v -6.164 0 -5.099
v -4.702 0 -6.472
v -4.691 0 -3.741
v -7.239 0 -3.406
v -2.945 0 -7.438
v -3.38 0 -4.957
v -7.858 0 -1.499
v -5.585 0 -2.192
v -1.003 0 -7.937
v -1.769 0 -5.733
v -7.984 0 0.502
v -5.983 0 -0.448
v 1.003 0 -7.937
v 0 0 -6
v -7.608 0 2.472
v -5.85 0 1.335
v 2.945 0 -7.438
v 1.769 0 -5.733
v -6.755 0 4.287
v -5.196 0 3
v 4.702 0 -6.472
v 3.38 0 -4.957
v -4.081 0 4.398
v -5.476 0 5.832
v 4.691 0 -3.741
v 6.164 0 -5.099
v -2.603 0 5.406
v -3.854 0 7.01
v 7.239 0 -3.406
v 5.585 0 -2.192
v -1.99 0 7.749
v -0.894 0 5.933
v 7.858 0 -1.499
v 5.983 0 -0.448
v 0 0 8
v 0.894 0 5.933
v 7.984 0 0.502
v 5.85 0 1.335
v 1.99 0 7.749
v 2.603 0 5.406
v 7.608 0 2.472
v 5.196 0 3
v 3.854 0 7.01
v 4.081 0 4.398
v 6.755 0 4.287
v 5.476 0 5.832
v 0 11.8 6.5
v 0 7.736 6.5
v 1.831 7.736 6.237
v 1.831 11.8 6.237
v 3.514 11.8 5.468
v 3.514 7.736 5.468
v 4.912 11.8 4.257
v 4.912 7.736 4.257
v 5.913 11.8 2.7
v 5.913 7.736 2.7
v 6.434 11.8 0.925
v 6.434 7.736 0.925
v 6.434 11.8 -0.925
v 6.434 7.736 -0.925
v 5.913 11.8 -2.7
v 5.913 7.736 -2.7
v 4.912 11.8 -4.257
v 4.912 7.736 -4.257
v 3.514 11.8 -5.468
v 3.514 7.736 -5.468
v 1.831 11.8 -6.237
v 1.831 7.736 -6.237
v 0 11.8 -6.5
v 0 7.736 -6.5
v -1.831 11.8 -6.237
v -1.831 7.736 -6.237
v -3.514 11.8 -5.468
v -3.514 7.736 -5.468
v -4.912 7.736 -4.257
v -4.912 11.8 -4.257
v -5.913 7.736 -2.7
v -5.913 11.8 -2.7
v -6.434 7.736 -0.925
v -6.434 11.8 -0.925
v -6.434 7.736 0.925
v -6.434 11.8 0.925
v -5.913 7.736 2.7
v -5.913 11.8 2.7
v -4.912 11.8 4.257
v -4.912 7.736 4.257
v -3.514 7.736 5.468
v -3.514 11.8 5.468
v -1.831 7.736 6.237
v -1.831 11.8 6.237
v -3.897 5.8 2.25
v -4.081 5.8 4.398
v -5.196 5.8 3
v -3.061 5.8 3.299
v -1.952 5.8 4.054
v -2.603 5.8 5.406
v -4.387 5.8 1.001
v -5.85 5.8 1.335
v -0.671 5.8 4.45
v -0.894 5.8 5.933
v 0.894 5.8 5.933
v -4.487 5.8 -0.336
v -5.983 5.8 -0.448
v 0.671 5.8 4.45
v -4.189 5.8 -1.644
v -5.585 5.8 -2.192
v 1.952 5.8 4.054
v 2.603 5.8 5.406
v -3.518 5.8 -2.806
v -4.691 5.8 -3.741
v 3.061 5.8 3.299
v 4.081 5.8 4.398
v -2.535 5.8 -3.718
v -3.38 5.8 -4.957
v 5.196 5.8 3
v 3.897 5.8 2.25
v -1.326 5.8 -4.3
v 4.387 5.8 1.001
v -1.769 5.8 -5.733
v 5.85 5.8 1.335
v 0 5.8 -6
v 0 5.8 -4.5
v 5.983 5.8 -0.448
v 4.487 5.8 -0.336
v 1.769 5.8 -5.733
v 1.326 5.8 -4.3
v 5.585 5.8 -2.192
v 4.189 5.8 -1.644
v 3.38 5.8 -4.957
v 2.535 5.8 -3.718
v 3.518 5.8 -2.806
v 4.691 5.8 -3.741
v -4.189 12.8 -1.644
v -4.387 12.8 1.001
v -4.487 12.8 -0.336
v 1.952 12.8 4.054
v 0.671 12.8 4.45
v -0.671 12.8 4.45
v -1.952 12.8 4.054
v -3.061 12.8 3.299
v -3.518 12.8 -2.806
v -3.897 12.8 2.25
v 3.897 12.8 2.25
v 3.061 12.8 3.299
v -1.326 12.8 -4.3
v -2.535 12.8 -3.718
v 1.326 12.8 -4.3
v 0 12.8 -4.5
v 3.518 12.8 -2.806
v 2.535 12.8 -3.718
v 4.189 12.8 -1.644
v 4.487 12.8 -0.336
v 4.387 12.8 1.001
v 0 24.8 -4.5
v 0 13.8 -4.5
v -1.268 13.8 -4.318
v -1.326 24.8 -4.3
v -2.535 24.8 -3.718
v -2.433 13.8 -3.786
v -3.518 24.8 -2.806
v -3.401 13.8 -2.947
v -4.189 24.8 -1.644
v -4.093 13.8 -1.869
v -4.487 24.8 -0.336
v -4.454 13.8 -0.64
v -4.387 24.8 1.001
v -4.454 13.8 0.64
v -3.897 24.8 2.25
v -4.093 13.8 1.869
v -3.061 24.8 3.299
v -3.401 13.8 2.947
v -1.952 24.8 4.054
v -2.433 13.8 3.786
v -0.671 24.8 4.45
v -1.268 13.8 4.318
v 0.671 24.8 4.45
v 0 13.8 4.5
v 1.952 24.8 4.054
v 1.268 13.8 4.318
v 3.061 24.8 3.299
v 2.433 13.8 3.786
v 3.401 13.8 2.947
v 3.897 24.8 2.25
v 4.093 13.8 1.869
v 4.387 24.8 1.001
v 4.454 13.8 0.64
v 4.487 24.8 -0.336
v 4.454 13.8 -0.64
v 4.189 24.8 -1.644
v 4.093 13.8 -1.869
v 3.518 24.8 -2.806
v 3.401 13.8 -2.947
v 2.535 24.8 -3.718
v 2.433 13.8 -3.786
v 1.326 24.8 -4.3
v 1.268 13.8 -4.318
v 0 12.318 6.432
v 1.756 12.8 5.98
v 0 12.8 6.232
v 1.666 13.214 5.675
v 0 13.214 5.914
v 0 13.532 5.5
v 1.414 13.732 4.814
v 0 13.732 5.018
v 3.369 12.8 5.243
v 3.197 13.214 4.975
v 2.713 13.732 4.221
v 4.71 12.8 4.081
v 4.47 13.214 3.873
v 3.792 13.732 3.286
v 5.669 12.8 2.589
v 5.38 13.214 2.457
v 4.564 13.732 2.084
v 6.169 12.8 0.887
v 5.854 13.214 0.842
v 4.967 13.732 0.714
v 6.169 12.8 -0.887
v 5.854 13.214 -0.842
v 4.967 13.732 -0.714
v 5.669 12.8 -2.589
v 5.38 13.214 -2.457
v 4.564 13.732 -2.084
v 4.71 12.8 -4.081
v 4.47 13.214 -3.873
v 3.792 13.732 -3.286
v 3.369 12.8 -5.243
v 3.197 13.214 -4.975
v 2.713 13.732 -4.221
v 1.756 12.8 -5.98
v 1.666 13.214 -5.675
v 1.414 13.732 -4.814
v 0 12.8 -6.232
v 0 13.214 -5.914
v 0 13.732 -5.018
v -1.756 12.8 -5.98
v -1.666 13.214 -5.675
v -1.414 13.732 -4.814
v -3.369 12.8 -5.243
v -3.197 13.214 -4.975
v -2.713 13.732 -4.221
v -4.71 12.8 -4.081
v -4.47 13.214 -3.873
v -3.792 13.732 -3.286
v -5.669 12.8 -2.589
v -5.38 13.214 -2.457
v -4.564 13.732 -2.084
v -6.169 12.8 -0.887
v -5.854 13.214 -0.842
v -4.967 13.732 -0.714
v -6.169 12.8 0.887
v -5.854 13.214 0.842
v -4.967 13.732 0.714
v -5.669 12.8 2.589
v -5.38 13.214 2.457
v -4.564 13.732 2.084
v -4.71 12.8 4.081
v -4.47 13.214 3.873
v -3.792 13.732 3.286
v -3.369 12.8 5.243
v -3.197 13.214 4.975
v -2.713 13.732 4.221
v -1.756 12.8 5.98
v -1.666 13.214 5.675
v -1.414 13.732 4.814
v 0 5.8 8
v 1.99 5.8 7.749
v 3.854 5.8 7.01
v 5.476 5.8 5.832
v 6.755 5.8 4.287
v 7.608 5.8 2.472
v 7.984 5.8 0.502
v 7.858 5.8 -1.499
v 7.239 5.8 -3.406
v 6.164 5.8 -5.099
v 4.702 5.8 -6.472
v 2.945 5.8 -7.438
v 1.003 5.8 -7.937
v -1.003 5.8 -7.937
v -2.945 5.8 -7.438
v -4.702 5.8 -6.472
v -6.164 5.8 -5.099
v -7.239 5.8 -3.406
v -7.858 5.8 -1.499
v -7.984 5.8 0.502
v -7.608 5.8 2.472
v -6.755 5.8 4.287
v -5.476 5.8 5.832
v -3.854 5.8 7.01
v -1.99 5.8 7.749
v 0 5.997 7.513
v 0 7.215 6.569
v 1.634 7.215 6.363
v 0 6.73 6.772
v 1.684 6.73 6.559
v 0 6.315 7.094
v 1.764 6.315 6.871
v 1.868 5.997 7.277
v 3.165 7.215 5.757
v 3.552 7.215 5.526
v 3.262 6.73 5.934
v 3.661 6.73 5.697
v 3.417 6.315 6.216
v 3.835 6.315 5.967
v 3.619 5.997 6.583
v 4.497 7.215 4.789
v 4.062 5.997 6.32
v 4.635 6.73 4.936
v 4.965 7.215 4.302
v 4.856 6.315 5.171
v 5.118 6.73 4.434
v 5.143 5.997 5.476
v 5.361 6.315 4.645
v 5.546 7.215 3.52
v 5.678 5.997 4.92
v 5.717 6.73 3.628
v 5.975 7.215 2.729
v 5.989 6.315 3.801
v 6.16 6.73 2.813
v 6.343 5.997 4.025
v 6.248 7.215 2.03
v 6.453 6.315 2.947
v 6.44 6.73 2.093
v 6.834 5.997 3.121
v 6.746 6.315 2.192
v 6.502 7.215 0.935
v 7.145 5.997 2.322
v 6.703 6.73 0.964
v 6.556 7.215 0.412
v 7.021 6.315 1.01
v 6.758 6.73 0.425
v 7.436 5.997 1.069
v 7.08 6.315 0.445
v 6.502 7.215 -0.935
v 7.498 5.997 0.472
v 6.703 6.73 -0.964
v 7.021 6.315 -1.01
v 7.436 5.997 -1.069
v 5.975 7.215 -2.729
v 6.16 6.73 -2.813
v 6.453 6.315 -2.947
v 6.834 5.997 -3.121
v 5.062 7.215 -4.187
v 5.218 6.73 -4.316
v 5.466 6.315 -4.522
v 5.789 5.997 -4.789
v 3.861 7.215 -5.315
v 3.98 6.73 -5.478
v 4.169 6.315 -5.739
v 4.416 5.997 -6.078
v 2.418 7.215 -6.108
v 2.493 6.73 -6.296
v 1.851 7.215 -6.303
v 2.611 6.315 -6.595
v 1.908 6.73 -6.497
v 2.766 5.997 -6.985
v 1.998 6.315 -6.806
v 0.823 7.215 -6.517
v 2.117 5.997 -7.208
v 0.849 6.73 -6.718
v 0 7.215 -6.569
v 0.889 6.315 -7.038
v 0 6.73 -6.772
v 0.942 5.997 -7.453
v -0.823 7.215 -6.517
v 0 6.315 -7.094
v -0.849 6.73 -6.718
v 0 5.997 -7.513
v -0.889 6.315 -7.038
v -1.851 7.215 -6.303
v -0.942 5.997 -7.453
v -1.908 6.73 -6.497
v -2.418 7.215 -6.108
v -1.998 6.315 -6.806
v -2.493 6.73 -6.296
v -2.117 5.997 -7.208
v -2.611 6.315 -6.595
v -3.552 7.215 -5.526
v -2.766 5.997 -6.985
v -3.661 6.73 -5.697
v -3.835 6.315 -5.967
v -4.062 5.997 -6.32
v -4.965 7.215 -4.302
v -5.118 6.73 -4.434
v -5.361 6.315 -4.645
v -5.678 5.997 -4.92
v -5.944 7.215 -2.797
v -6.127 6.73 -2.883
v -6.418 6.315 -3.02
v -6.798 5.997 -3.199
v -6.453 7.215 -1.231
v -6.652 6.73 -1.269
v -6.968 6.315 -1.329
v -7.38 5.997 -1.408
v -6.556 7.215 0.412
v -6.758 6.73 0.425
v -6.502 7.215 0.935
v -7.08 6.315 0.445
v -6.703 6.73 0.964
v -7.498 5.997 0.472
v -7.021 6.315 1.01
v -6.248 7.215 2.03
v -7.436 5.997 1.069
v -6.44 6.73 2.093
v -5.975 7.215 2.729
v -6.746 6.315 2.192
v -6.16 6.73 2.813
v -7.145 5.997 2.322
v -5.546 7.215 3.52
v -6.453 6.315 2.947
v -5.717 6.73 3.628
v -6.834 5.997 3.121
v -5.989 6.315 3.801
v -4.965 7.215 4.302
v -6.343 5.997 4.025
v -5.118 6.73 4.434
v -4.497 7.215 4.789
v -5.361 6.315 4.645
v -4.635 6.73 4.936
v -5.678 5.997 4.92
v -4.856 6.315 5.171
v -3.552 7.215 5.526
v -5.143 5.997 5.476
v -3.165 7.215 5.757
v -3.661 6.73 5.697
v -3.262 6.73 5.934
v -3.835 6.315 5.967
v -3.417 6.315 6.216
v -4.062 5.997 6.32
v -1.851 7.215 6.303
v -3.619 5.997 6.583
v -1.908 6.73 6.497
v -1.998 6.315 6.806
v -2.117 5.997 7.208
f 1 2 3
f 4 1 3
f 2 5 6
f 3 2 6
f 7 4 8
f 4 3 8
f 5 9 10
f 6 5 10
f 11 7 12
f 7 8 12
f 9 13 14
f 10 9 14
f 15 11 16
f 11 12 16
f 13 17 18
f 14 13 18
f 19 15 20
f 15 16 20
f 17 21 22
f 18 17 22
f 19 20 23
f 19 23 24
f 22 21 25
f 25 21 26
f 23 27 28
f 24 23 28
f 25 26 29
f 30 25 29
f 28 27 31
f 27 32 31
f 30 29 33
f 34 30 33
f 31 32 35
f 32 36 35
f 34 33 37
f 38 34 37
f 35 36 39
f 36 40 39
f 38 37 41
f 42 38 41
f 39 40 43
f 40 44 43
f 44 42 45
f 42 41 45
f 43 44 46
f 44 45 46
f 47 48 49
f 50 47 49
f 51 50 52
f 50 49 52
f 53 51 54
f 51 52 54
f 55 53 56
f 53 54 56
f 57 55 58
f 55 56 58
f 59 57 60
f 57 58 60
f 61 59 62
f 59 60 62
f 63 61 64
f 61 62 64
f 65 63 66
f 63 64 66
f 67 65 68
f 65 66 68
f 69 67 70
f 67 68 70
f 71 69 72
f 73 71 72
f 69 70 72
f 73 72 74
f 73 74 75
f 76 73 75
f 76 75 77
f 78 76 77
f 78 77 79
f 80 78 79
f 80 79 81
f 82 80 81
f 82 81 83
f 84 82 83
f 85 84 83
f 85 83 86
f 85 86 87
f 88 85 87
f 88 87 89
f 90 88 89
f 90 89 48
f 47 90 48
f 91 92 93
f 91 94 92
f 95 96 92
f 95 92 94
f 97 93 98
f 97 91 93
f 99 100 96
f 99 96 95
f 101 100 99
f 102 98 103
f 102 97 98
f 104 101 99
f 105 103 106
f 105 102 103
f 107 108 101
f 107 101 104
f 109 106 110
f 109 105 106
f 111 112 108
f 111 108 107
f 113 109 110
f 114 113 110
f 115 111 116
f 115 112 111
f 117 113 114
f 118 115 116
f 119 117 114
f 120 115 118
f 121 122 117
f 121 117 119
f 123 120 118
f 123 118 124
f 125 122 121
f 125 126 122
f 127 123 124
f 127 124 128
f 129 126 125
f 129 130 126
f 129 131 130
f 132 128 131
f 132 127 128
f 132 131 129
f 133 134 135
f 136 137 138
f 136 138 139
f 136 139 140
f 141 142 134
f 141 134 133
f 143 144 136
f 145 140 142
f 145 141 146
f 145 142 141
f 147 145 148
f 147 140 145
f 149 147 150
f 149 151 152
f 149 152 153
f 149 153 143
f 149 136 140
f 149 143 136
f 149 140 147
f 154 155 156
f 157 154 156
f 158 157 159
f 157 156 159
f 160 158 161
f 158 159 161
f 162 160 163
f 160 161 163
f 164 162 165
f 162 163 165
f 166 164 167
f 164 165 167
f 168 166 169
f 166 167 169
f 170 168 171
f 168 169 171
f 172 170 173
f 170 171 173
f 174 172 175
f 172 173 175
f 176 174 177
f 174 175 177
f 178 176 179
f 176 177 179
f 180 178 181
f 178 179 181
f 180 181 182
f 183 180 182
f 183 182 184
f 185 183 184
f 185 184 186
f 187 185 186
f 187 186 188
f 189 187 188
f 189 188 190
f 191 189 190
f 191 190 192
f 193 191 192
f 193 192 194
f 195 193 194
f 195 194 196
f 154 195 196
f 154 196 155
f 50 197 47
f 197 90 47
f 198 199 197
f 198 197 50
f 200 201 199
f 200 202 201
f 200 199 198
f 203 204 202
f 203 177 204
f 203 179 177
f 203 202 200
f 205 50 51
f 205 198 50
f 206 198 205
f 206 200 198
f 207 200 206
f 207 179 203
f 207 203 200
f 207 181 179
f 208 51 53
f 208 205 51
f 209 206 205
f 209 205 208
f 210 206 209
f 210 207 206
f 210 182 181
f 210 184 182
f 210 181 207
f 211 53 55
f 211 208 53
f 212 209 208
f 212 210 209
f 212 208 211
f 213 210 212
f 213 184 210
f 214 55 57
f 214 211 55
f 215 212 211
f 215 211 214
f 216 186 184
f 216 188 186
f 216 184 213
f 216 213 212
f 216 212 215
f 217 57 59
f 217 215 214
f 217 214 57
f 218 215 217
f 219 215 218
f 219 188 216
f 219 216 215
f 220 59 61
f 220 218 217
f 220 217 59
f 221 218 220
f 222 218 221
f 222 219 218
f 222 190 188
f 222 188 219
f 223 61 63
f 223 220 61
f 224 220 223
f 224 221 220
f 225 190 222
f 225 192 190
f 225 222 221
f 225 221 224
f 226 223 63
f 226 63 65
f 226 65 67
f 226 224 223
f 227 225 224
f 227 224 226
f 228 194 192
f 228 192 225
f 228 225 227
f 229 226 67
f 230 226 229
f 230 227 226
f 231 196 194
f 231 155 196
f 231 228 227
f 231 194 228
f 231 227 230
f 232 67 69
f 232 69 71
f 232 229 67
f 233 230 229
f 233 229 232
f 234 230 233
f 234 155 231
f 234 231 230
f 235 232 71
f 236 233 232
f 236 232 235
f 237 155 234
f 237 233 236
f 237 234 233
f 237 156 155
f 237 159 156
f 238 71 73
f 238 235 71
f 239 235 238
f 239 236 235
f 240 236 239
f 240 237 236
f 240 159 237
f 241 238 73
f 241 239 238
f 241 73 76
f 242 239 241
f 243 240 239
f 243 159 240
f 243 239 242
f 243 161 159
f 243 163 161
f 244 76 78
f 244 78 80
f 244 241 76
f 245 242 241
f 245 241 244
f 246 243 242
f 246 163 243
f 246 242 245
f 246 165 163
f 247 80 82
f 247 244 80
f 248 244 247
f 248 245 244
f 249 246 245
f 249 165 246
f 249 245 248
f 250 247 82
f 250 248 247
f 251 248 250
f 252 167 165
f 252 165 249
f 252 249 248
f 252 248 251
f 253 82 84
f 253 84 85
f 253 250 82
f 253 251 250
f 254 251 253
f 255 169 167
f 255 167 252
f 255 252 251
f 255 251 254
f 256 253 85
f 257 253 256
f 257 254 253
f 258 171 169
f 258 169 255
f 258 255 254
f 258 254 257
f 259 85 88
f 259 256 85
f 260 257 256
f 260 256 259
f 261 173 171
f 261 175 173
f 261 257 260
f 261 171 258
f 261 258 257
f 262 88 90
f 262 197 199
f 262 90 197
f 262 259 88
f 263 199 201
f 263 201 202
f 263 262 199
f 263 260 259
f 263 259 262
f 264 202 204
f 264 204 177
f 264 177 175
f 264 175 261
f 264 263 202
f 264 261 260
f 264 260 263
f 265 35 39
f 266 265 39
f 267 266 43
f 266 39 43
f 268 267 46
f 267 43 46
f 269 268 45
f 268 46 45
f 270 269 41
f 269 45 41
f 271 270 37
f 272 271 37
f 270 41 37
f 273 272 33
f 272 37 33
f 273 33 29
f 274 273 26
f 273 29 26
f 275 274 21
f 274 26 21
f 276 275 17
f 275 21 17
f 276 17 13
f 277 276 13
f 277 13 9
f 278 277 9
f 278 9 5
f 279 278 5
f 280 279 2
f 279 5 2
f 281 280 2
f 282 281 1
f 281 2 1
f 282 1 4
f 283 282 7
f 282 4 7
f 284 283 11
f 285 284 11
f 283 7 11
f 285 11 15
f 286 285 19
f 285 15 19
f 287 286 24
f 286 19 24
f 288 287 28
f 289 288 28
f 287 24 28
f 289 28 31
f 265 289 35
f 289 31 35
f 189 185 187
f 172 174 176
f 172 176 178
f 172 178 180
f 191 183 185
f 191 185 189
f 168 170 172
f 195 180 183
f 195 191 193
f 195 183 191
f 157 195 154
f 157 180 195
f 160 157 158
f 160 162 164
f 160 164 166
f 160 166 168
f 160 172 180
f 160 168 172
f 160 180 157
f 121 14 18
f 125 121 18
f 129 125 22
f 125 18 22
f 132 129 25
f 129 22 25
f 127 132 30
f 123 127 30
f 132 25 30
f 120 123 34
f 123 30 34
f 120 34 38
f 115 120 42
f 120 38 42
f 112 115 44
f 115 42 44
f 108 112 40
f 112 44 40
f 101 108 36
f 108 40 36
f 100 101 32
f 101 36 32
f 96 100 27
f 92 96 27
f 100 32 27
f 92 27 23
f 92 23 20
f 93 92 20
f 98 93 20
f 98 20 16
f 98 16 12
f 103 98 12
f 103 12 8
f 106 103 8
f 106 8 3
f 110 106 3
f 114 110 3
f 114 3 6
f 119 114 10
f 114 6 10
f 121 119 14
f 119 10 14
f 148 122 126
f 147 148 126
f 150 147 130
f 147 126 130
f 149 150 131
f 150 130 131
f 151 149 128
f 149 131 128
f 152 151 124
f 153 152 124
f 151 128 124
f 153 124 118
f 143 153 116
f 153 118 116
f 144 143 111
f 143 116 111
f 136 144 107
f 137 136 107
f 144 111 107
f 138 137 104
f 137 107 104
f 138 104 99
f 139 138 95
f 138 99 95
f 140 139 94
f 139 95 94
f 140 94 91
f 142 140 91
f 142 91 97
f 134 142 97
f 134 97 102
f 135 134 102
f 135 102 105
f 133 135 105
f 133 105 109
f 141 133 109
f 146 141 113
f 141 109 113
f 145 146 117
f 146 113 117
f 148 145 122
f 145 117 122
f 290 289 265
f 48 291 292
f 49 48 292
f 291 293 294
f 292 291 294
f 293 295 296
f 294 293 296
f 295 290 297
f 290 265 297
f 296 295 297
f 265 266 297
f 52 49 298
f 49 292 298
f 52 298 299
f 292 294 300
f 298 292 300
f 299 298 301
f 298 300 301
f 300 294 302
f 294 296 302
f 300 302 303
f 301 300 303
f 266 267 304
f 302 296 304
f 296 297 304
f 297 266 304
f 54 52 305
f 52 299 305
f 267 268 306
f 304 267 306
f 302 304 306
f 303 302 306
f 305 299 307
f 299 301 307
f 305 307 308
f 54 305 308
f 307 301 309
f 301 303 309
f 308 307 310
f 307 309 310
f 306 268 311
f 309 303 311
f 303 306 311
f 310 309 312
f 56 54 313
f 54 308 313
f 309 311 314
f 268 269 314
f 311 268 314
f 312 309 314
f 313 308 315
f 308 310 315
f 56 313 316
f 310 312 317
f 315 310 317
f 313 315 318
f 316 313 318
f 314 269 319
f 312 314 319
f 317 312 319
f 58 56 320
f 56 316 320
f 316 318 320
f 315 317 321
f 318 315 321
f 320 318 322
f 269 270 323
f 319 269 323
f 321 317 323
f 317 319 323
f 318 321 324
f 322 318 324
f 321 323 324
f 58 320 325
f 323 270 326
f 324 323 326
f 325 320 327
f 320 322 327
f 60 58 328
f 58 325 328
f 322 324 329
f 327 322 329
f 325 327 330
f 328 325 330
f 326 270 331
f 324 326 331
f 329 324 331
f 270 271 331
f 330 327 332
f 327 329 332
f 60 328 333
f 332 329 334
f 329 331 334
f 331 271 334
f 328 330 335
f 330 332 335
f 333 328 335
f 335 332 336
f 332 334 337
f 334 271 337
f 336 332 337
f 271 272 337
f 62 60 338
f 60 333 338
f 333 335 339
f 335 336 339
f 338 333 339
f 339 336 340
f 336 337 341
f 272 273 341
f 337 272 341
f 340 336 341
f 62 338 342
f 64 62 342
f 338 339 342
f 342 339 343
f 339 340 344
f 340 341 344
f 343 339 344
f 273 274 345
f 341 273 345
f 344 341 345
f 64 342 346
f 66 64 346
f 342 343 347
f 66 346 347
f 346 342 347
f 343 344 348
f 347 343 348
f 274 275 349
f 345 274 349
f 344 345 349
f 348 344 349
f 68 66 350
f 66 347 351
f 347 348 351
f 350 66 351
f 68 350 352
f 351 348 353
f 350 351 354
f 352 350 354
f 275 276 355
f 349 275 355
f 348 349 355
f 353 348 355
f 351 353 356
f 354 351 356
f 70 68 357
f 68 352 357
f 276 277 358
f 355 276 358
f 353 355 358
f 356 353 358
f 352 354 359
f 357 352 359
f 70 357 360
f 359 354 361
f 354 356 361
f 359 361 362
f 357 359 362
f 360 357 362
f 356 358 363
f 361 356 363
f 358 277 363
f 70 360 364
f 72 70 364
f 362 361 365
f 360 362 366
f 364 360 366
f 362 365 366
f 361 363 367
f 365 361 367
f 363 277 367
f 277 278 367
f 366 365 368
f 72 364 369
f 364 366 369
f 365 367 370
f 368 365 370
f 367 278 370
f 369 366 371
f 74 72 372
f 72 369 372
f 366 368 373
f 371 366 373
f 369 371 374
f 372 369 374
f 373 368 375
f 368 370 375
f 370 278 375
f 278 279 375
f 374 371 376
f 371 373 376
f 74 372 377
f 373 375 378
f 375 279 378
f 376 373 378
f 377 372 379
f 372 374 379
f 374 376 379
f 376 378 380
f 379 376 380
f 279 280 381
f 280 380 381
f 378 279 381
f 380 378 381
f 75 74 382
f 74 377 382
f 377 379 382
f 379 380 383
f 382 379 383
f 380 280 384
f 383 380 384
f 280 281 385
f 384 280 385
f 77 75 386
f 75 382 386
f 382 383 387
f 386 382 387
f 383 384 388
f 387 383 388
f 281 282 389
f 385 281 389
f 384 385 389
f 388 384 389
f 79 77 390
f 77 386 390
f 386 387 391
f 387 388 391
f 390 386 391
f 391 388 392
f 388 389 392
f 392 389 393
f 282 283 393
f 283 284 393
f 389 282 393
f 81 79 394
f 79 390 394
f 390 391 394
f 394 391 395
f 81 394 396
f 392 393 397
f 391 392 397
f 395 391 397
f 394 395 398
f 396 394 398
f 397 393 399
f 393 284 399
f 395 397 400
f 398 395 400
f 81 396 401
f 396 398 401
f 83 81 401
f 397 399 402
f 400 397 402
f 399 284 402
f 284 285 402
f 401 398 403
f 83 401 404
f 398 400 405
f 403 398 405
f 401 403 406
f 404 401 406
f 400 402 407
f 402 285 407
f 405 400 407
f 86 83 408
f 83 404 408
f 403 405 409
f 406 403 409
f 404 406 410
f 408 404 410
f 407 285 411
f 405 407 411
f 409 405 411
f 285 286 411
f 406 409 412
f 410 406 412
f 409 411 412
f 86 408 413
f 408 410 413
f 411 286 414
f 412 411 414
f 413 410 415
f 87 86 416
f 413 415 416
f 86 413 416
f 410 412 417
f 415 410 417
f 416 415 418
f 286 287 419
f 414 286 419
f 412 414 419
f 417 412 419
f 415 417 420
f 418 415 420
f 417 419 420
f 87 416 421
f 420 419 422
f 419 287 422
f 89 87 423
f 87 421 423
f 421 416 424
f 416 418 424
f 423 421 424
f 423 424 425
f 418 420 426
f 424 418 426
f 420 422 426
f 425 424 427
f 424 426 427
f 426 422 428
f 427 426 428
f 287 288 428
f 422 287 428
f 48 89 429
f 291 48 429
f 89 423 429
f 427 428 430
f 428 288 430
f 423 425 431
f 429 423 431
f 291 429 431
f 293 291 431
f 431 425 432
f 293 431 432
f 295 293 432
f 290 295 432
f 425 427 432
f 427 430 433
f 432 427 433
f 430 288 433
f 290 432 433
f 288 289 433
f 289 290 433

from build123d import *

# Parameters (mm, degrees)
SKETCH1_R           = 8
BOSS_EXTRUDE1_DEPTH = 5.8
SKETCH2_R           = 6.5
BOSS_EXTRUDE2_DEPTH = 8
SKETCH3_R           = 6
CUT_EXTRUDE1_DEPTH  = 5.8
SKETCH4_R           = 4.5
CUT_EXTRUDE2_DEPTH  = 7
SKETCH5_R           = 4.5
BOSS_EXTRUDE3_DEPTH = 11
FILLET1_R           = 2


with BuildPart() as part:
    # Sketch1 → Boss-Extrude1 (new body)
    with BuildSketch(Plane(origin=(0, 0, 0), x_dir=(1, 0, 0), z_dir=(0, 1, 0))):
        with Locations(Location((0, 0, 0), (0, 0, 270))):
            Circle(SKETCH1_R)
    extrude(amount=BOSS_EXTRUDE1_DEPTH)

    # Sketch2 → Boss-Extrude2 (add)
    with BuildSketch(Plane(origin=(0, 5.8, 0), x_dir=(-1, 0, 0), z_dir=(0, 1, 0))):
        with Locations(Location((0, 0, 0), (0, 0, 90))):
            Circle(SKETCH2_R)
    extrude(amount=BOSS_EXTRUDE2_DEPTH)

    # Sketch3 → Cut-Extrude1 (cut)
    with BuildSketch(Plane.XZ):
        with Locations(Location((0, 0, 0), (0, 0, 270))):
            Circle(SKETCH3_R)
    extrude(amount=-CUT_EXTRUDE1_DEPTH, mode=Mode.SUBTRACT)

    # Sketch4 → Cut-Extrude2 (cut)
    with BuildSketch(Plane.XZ.offset(-5.8)):
        with Locations(Location((0, 0, 0), (0, 0, 270))):
            Circle(SKETCH4_R)
    extrude(amount=-CUT_EXTRUDE2_DEPTH, mode=Mode.SUBTRACT)

    # Sketch5 → Boss-Extrude3 (add)
    with BuildSketch(Plane(origin=(0, 13.8, 0), x_dir=(-1, 0, 0), z_dir=(0, 1, 0))):
        with Locations(Location((0, 0, 0), (0, 0, 270))):
            Circle(SKETCH5_R)
    extrude(amount=BOSS_EXTRUDE3_DEPTH)

    # Fillet1
    # the kernel refuses this fillet: 2 mm, written as the material it adds along each edge
    with BuildSketch(Plane(origin=(0, 5.8, 0), x_dir=(0, 0, 1), z_dir=(-1, 0, 0))) as fillet1_piece_1:
        with BuildLine():
            CenterArc((8.5, 1.936491673), FILLET1_R, 180, 75.522487814)
            Line((6.5, 1.936491673), (6.5, 0))
            Line((6.5, 0), (8, 0))
        make_face()
    revolve(axis=Axis((0, 5.8, 0), (0, 1, 0)))
    # the kernel refuses this fillet: 2 mm, written as the material it takes off along each edge
    with BuildSketch(Plane(origin=(0, 13.8, 0), x_dir=(0, 0, 1), z_dir=(-1, 0, 0))) as fillet1_2_piece_1:
        with BuildLine():
            CenterArc((6.5 - FILLET1_R, -FILLET1_R), FILLET1_R, 0, 90)
            Line((6.5 - FILLET1_R, 0), (6.5, 0))
            Line((6.5, 0), (6.5, -FILLET1_R))
        make_face()
    revolve(axis=Axis((0, 13.8, 0), (0, 1, 0)), mode=Mode.SUBTRACT)


solid = part.part
